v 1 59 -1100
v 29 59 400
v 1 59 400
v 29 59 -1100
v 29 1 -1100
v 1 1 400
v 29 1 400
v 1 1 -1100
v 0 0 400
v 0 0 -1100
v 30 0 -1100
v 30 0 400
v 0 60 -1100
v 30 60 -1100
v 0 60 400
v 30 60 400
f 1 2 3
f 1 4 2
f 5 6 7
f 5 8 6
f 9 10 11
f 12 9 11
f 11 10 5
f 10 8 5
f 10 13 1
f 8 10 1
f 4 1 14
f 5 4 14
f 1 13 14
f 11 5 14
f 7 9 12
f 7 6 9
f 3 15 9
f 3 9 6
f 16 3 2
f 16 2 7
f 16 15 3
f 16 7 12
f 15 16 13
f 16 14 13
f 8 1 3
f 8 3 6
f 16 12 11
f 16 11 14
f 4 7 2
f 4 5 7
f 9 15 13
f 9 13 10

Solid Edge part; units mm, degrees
sketch "Sketch1" plane through (0, 0, 0) normal (0, 0, 1) x (1, 0, 0)
  line L0 (29, 1) -> (29, 59)
  line L1 (29, 59) -> (1, 59)
  line L2 (1, 59) -> (1, 1)
  line L3 (1, 1) -> (29, 1)
  line L4 (30, 0) -> (30, 60)
  line L5 (30, 60) -> (0, 60)
  line L6 (0, 60) -> (0, 0)
  line L7 (0, 0) -> (30, 0)
extrude "Protrusion1" add sketch "Sketch1" along normal blind 400
sketch "Sketch2" plane through (0, 0, 0) normal (0, 0, 1) x (1, 0, 0)
  line L0 (30, 0) -> (30, 60)
  line L1 (30, 60) -> (0, 60)
  line L2 (0, 60) -> (0, 0)
  line L3 (0, 0) -> (30, 0)
  line L4 (29, 1) -> (29, 59)
  line L5 (29, 59) -> (1, 59)
  line L6 (1, 59) -> (1, 1)
  line L7 (1, 1) -> (29, 1)
extrude "ExtrudedProtrusion_6" add sketch "Sketch2" against normal blind 1100
properties material "Galvanized steel"
